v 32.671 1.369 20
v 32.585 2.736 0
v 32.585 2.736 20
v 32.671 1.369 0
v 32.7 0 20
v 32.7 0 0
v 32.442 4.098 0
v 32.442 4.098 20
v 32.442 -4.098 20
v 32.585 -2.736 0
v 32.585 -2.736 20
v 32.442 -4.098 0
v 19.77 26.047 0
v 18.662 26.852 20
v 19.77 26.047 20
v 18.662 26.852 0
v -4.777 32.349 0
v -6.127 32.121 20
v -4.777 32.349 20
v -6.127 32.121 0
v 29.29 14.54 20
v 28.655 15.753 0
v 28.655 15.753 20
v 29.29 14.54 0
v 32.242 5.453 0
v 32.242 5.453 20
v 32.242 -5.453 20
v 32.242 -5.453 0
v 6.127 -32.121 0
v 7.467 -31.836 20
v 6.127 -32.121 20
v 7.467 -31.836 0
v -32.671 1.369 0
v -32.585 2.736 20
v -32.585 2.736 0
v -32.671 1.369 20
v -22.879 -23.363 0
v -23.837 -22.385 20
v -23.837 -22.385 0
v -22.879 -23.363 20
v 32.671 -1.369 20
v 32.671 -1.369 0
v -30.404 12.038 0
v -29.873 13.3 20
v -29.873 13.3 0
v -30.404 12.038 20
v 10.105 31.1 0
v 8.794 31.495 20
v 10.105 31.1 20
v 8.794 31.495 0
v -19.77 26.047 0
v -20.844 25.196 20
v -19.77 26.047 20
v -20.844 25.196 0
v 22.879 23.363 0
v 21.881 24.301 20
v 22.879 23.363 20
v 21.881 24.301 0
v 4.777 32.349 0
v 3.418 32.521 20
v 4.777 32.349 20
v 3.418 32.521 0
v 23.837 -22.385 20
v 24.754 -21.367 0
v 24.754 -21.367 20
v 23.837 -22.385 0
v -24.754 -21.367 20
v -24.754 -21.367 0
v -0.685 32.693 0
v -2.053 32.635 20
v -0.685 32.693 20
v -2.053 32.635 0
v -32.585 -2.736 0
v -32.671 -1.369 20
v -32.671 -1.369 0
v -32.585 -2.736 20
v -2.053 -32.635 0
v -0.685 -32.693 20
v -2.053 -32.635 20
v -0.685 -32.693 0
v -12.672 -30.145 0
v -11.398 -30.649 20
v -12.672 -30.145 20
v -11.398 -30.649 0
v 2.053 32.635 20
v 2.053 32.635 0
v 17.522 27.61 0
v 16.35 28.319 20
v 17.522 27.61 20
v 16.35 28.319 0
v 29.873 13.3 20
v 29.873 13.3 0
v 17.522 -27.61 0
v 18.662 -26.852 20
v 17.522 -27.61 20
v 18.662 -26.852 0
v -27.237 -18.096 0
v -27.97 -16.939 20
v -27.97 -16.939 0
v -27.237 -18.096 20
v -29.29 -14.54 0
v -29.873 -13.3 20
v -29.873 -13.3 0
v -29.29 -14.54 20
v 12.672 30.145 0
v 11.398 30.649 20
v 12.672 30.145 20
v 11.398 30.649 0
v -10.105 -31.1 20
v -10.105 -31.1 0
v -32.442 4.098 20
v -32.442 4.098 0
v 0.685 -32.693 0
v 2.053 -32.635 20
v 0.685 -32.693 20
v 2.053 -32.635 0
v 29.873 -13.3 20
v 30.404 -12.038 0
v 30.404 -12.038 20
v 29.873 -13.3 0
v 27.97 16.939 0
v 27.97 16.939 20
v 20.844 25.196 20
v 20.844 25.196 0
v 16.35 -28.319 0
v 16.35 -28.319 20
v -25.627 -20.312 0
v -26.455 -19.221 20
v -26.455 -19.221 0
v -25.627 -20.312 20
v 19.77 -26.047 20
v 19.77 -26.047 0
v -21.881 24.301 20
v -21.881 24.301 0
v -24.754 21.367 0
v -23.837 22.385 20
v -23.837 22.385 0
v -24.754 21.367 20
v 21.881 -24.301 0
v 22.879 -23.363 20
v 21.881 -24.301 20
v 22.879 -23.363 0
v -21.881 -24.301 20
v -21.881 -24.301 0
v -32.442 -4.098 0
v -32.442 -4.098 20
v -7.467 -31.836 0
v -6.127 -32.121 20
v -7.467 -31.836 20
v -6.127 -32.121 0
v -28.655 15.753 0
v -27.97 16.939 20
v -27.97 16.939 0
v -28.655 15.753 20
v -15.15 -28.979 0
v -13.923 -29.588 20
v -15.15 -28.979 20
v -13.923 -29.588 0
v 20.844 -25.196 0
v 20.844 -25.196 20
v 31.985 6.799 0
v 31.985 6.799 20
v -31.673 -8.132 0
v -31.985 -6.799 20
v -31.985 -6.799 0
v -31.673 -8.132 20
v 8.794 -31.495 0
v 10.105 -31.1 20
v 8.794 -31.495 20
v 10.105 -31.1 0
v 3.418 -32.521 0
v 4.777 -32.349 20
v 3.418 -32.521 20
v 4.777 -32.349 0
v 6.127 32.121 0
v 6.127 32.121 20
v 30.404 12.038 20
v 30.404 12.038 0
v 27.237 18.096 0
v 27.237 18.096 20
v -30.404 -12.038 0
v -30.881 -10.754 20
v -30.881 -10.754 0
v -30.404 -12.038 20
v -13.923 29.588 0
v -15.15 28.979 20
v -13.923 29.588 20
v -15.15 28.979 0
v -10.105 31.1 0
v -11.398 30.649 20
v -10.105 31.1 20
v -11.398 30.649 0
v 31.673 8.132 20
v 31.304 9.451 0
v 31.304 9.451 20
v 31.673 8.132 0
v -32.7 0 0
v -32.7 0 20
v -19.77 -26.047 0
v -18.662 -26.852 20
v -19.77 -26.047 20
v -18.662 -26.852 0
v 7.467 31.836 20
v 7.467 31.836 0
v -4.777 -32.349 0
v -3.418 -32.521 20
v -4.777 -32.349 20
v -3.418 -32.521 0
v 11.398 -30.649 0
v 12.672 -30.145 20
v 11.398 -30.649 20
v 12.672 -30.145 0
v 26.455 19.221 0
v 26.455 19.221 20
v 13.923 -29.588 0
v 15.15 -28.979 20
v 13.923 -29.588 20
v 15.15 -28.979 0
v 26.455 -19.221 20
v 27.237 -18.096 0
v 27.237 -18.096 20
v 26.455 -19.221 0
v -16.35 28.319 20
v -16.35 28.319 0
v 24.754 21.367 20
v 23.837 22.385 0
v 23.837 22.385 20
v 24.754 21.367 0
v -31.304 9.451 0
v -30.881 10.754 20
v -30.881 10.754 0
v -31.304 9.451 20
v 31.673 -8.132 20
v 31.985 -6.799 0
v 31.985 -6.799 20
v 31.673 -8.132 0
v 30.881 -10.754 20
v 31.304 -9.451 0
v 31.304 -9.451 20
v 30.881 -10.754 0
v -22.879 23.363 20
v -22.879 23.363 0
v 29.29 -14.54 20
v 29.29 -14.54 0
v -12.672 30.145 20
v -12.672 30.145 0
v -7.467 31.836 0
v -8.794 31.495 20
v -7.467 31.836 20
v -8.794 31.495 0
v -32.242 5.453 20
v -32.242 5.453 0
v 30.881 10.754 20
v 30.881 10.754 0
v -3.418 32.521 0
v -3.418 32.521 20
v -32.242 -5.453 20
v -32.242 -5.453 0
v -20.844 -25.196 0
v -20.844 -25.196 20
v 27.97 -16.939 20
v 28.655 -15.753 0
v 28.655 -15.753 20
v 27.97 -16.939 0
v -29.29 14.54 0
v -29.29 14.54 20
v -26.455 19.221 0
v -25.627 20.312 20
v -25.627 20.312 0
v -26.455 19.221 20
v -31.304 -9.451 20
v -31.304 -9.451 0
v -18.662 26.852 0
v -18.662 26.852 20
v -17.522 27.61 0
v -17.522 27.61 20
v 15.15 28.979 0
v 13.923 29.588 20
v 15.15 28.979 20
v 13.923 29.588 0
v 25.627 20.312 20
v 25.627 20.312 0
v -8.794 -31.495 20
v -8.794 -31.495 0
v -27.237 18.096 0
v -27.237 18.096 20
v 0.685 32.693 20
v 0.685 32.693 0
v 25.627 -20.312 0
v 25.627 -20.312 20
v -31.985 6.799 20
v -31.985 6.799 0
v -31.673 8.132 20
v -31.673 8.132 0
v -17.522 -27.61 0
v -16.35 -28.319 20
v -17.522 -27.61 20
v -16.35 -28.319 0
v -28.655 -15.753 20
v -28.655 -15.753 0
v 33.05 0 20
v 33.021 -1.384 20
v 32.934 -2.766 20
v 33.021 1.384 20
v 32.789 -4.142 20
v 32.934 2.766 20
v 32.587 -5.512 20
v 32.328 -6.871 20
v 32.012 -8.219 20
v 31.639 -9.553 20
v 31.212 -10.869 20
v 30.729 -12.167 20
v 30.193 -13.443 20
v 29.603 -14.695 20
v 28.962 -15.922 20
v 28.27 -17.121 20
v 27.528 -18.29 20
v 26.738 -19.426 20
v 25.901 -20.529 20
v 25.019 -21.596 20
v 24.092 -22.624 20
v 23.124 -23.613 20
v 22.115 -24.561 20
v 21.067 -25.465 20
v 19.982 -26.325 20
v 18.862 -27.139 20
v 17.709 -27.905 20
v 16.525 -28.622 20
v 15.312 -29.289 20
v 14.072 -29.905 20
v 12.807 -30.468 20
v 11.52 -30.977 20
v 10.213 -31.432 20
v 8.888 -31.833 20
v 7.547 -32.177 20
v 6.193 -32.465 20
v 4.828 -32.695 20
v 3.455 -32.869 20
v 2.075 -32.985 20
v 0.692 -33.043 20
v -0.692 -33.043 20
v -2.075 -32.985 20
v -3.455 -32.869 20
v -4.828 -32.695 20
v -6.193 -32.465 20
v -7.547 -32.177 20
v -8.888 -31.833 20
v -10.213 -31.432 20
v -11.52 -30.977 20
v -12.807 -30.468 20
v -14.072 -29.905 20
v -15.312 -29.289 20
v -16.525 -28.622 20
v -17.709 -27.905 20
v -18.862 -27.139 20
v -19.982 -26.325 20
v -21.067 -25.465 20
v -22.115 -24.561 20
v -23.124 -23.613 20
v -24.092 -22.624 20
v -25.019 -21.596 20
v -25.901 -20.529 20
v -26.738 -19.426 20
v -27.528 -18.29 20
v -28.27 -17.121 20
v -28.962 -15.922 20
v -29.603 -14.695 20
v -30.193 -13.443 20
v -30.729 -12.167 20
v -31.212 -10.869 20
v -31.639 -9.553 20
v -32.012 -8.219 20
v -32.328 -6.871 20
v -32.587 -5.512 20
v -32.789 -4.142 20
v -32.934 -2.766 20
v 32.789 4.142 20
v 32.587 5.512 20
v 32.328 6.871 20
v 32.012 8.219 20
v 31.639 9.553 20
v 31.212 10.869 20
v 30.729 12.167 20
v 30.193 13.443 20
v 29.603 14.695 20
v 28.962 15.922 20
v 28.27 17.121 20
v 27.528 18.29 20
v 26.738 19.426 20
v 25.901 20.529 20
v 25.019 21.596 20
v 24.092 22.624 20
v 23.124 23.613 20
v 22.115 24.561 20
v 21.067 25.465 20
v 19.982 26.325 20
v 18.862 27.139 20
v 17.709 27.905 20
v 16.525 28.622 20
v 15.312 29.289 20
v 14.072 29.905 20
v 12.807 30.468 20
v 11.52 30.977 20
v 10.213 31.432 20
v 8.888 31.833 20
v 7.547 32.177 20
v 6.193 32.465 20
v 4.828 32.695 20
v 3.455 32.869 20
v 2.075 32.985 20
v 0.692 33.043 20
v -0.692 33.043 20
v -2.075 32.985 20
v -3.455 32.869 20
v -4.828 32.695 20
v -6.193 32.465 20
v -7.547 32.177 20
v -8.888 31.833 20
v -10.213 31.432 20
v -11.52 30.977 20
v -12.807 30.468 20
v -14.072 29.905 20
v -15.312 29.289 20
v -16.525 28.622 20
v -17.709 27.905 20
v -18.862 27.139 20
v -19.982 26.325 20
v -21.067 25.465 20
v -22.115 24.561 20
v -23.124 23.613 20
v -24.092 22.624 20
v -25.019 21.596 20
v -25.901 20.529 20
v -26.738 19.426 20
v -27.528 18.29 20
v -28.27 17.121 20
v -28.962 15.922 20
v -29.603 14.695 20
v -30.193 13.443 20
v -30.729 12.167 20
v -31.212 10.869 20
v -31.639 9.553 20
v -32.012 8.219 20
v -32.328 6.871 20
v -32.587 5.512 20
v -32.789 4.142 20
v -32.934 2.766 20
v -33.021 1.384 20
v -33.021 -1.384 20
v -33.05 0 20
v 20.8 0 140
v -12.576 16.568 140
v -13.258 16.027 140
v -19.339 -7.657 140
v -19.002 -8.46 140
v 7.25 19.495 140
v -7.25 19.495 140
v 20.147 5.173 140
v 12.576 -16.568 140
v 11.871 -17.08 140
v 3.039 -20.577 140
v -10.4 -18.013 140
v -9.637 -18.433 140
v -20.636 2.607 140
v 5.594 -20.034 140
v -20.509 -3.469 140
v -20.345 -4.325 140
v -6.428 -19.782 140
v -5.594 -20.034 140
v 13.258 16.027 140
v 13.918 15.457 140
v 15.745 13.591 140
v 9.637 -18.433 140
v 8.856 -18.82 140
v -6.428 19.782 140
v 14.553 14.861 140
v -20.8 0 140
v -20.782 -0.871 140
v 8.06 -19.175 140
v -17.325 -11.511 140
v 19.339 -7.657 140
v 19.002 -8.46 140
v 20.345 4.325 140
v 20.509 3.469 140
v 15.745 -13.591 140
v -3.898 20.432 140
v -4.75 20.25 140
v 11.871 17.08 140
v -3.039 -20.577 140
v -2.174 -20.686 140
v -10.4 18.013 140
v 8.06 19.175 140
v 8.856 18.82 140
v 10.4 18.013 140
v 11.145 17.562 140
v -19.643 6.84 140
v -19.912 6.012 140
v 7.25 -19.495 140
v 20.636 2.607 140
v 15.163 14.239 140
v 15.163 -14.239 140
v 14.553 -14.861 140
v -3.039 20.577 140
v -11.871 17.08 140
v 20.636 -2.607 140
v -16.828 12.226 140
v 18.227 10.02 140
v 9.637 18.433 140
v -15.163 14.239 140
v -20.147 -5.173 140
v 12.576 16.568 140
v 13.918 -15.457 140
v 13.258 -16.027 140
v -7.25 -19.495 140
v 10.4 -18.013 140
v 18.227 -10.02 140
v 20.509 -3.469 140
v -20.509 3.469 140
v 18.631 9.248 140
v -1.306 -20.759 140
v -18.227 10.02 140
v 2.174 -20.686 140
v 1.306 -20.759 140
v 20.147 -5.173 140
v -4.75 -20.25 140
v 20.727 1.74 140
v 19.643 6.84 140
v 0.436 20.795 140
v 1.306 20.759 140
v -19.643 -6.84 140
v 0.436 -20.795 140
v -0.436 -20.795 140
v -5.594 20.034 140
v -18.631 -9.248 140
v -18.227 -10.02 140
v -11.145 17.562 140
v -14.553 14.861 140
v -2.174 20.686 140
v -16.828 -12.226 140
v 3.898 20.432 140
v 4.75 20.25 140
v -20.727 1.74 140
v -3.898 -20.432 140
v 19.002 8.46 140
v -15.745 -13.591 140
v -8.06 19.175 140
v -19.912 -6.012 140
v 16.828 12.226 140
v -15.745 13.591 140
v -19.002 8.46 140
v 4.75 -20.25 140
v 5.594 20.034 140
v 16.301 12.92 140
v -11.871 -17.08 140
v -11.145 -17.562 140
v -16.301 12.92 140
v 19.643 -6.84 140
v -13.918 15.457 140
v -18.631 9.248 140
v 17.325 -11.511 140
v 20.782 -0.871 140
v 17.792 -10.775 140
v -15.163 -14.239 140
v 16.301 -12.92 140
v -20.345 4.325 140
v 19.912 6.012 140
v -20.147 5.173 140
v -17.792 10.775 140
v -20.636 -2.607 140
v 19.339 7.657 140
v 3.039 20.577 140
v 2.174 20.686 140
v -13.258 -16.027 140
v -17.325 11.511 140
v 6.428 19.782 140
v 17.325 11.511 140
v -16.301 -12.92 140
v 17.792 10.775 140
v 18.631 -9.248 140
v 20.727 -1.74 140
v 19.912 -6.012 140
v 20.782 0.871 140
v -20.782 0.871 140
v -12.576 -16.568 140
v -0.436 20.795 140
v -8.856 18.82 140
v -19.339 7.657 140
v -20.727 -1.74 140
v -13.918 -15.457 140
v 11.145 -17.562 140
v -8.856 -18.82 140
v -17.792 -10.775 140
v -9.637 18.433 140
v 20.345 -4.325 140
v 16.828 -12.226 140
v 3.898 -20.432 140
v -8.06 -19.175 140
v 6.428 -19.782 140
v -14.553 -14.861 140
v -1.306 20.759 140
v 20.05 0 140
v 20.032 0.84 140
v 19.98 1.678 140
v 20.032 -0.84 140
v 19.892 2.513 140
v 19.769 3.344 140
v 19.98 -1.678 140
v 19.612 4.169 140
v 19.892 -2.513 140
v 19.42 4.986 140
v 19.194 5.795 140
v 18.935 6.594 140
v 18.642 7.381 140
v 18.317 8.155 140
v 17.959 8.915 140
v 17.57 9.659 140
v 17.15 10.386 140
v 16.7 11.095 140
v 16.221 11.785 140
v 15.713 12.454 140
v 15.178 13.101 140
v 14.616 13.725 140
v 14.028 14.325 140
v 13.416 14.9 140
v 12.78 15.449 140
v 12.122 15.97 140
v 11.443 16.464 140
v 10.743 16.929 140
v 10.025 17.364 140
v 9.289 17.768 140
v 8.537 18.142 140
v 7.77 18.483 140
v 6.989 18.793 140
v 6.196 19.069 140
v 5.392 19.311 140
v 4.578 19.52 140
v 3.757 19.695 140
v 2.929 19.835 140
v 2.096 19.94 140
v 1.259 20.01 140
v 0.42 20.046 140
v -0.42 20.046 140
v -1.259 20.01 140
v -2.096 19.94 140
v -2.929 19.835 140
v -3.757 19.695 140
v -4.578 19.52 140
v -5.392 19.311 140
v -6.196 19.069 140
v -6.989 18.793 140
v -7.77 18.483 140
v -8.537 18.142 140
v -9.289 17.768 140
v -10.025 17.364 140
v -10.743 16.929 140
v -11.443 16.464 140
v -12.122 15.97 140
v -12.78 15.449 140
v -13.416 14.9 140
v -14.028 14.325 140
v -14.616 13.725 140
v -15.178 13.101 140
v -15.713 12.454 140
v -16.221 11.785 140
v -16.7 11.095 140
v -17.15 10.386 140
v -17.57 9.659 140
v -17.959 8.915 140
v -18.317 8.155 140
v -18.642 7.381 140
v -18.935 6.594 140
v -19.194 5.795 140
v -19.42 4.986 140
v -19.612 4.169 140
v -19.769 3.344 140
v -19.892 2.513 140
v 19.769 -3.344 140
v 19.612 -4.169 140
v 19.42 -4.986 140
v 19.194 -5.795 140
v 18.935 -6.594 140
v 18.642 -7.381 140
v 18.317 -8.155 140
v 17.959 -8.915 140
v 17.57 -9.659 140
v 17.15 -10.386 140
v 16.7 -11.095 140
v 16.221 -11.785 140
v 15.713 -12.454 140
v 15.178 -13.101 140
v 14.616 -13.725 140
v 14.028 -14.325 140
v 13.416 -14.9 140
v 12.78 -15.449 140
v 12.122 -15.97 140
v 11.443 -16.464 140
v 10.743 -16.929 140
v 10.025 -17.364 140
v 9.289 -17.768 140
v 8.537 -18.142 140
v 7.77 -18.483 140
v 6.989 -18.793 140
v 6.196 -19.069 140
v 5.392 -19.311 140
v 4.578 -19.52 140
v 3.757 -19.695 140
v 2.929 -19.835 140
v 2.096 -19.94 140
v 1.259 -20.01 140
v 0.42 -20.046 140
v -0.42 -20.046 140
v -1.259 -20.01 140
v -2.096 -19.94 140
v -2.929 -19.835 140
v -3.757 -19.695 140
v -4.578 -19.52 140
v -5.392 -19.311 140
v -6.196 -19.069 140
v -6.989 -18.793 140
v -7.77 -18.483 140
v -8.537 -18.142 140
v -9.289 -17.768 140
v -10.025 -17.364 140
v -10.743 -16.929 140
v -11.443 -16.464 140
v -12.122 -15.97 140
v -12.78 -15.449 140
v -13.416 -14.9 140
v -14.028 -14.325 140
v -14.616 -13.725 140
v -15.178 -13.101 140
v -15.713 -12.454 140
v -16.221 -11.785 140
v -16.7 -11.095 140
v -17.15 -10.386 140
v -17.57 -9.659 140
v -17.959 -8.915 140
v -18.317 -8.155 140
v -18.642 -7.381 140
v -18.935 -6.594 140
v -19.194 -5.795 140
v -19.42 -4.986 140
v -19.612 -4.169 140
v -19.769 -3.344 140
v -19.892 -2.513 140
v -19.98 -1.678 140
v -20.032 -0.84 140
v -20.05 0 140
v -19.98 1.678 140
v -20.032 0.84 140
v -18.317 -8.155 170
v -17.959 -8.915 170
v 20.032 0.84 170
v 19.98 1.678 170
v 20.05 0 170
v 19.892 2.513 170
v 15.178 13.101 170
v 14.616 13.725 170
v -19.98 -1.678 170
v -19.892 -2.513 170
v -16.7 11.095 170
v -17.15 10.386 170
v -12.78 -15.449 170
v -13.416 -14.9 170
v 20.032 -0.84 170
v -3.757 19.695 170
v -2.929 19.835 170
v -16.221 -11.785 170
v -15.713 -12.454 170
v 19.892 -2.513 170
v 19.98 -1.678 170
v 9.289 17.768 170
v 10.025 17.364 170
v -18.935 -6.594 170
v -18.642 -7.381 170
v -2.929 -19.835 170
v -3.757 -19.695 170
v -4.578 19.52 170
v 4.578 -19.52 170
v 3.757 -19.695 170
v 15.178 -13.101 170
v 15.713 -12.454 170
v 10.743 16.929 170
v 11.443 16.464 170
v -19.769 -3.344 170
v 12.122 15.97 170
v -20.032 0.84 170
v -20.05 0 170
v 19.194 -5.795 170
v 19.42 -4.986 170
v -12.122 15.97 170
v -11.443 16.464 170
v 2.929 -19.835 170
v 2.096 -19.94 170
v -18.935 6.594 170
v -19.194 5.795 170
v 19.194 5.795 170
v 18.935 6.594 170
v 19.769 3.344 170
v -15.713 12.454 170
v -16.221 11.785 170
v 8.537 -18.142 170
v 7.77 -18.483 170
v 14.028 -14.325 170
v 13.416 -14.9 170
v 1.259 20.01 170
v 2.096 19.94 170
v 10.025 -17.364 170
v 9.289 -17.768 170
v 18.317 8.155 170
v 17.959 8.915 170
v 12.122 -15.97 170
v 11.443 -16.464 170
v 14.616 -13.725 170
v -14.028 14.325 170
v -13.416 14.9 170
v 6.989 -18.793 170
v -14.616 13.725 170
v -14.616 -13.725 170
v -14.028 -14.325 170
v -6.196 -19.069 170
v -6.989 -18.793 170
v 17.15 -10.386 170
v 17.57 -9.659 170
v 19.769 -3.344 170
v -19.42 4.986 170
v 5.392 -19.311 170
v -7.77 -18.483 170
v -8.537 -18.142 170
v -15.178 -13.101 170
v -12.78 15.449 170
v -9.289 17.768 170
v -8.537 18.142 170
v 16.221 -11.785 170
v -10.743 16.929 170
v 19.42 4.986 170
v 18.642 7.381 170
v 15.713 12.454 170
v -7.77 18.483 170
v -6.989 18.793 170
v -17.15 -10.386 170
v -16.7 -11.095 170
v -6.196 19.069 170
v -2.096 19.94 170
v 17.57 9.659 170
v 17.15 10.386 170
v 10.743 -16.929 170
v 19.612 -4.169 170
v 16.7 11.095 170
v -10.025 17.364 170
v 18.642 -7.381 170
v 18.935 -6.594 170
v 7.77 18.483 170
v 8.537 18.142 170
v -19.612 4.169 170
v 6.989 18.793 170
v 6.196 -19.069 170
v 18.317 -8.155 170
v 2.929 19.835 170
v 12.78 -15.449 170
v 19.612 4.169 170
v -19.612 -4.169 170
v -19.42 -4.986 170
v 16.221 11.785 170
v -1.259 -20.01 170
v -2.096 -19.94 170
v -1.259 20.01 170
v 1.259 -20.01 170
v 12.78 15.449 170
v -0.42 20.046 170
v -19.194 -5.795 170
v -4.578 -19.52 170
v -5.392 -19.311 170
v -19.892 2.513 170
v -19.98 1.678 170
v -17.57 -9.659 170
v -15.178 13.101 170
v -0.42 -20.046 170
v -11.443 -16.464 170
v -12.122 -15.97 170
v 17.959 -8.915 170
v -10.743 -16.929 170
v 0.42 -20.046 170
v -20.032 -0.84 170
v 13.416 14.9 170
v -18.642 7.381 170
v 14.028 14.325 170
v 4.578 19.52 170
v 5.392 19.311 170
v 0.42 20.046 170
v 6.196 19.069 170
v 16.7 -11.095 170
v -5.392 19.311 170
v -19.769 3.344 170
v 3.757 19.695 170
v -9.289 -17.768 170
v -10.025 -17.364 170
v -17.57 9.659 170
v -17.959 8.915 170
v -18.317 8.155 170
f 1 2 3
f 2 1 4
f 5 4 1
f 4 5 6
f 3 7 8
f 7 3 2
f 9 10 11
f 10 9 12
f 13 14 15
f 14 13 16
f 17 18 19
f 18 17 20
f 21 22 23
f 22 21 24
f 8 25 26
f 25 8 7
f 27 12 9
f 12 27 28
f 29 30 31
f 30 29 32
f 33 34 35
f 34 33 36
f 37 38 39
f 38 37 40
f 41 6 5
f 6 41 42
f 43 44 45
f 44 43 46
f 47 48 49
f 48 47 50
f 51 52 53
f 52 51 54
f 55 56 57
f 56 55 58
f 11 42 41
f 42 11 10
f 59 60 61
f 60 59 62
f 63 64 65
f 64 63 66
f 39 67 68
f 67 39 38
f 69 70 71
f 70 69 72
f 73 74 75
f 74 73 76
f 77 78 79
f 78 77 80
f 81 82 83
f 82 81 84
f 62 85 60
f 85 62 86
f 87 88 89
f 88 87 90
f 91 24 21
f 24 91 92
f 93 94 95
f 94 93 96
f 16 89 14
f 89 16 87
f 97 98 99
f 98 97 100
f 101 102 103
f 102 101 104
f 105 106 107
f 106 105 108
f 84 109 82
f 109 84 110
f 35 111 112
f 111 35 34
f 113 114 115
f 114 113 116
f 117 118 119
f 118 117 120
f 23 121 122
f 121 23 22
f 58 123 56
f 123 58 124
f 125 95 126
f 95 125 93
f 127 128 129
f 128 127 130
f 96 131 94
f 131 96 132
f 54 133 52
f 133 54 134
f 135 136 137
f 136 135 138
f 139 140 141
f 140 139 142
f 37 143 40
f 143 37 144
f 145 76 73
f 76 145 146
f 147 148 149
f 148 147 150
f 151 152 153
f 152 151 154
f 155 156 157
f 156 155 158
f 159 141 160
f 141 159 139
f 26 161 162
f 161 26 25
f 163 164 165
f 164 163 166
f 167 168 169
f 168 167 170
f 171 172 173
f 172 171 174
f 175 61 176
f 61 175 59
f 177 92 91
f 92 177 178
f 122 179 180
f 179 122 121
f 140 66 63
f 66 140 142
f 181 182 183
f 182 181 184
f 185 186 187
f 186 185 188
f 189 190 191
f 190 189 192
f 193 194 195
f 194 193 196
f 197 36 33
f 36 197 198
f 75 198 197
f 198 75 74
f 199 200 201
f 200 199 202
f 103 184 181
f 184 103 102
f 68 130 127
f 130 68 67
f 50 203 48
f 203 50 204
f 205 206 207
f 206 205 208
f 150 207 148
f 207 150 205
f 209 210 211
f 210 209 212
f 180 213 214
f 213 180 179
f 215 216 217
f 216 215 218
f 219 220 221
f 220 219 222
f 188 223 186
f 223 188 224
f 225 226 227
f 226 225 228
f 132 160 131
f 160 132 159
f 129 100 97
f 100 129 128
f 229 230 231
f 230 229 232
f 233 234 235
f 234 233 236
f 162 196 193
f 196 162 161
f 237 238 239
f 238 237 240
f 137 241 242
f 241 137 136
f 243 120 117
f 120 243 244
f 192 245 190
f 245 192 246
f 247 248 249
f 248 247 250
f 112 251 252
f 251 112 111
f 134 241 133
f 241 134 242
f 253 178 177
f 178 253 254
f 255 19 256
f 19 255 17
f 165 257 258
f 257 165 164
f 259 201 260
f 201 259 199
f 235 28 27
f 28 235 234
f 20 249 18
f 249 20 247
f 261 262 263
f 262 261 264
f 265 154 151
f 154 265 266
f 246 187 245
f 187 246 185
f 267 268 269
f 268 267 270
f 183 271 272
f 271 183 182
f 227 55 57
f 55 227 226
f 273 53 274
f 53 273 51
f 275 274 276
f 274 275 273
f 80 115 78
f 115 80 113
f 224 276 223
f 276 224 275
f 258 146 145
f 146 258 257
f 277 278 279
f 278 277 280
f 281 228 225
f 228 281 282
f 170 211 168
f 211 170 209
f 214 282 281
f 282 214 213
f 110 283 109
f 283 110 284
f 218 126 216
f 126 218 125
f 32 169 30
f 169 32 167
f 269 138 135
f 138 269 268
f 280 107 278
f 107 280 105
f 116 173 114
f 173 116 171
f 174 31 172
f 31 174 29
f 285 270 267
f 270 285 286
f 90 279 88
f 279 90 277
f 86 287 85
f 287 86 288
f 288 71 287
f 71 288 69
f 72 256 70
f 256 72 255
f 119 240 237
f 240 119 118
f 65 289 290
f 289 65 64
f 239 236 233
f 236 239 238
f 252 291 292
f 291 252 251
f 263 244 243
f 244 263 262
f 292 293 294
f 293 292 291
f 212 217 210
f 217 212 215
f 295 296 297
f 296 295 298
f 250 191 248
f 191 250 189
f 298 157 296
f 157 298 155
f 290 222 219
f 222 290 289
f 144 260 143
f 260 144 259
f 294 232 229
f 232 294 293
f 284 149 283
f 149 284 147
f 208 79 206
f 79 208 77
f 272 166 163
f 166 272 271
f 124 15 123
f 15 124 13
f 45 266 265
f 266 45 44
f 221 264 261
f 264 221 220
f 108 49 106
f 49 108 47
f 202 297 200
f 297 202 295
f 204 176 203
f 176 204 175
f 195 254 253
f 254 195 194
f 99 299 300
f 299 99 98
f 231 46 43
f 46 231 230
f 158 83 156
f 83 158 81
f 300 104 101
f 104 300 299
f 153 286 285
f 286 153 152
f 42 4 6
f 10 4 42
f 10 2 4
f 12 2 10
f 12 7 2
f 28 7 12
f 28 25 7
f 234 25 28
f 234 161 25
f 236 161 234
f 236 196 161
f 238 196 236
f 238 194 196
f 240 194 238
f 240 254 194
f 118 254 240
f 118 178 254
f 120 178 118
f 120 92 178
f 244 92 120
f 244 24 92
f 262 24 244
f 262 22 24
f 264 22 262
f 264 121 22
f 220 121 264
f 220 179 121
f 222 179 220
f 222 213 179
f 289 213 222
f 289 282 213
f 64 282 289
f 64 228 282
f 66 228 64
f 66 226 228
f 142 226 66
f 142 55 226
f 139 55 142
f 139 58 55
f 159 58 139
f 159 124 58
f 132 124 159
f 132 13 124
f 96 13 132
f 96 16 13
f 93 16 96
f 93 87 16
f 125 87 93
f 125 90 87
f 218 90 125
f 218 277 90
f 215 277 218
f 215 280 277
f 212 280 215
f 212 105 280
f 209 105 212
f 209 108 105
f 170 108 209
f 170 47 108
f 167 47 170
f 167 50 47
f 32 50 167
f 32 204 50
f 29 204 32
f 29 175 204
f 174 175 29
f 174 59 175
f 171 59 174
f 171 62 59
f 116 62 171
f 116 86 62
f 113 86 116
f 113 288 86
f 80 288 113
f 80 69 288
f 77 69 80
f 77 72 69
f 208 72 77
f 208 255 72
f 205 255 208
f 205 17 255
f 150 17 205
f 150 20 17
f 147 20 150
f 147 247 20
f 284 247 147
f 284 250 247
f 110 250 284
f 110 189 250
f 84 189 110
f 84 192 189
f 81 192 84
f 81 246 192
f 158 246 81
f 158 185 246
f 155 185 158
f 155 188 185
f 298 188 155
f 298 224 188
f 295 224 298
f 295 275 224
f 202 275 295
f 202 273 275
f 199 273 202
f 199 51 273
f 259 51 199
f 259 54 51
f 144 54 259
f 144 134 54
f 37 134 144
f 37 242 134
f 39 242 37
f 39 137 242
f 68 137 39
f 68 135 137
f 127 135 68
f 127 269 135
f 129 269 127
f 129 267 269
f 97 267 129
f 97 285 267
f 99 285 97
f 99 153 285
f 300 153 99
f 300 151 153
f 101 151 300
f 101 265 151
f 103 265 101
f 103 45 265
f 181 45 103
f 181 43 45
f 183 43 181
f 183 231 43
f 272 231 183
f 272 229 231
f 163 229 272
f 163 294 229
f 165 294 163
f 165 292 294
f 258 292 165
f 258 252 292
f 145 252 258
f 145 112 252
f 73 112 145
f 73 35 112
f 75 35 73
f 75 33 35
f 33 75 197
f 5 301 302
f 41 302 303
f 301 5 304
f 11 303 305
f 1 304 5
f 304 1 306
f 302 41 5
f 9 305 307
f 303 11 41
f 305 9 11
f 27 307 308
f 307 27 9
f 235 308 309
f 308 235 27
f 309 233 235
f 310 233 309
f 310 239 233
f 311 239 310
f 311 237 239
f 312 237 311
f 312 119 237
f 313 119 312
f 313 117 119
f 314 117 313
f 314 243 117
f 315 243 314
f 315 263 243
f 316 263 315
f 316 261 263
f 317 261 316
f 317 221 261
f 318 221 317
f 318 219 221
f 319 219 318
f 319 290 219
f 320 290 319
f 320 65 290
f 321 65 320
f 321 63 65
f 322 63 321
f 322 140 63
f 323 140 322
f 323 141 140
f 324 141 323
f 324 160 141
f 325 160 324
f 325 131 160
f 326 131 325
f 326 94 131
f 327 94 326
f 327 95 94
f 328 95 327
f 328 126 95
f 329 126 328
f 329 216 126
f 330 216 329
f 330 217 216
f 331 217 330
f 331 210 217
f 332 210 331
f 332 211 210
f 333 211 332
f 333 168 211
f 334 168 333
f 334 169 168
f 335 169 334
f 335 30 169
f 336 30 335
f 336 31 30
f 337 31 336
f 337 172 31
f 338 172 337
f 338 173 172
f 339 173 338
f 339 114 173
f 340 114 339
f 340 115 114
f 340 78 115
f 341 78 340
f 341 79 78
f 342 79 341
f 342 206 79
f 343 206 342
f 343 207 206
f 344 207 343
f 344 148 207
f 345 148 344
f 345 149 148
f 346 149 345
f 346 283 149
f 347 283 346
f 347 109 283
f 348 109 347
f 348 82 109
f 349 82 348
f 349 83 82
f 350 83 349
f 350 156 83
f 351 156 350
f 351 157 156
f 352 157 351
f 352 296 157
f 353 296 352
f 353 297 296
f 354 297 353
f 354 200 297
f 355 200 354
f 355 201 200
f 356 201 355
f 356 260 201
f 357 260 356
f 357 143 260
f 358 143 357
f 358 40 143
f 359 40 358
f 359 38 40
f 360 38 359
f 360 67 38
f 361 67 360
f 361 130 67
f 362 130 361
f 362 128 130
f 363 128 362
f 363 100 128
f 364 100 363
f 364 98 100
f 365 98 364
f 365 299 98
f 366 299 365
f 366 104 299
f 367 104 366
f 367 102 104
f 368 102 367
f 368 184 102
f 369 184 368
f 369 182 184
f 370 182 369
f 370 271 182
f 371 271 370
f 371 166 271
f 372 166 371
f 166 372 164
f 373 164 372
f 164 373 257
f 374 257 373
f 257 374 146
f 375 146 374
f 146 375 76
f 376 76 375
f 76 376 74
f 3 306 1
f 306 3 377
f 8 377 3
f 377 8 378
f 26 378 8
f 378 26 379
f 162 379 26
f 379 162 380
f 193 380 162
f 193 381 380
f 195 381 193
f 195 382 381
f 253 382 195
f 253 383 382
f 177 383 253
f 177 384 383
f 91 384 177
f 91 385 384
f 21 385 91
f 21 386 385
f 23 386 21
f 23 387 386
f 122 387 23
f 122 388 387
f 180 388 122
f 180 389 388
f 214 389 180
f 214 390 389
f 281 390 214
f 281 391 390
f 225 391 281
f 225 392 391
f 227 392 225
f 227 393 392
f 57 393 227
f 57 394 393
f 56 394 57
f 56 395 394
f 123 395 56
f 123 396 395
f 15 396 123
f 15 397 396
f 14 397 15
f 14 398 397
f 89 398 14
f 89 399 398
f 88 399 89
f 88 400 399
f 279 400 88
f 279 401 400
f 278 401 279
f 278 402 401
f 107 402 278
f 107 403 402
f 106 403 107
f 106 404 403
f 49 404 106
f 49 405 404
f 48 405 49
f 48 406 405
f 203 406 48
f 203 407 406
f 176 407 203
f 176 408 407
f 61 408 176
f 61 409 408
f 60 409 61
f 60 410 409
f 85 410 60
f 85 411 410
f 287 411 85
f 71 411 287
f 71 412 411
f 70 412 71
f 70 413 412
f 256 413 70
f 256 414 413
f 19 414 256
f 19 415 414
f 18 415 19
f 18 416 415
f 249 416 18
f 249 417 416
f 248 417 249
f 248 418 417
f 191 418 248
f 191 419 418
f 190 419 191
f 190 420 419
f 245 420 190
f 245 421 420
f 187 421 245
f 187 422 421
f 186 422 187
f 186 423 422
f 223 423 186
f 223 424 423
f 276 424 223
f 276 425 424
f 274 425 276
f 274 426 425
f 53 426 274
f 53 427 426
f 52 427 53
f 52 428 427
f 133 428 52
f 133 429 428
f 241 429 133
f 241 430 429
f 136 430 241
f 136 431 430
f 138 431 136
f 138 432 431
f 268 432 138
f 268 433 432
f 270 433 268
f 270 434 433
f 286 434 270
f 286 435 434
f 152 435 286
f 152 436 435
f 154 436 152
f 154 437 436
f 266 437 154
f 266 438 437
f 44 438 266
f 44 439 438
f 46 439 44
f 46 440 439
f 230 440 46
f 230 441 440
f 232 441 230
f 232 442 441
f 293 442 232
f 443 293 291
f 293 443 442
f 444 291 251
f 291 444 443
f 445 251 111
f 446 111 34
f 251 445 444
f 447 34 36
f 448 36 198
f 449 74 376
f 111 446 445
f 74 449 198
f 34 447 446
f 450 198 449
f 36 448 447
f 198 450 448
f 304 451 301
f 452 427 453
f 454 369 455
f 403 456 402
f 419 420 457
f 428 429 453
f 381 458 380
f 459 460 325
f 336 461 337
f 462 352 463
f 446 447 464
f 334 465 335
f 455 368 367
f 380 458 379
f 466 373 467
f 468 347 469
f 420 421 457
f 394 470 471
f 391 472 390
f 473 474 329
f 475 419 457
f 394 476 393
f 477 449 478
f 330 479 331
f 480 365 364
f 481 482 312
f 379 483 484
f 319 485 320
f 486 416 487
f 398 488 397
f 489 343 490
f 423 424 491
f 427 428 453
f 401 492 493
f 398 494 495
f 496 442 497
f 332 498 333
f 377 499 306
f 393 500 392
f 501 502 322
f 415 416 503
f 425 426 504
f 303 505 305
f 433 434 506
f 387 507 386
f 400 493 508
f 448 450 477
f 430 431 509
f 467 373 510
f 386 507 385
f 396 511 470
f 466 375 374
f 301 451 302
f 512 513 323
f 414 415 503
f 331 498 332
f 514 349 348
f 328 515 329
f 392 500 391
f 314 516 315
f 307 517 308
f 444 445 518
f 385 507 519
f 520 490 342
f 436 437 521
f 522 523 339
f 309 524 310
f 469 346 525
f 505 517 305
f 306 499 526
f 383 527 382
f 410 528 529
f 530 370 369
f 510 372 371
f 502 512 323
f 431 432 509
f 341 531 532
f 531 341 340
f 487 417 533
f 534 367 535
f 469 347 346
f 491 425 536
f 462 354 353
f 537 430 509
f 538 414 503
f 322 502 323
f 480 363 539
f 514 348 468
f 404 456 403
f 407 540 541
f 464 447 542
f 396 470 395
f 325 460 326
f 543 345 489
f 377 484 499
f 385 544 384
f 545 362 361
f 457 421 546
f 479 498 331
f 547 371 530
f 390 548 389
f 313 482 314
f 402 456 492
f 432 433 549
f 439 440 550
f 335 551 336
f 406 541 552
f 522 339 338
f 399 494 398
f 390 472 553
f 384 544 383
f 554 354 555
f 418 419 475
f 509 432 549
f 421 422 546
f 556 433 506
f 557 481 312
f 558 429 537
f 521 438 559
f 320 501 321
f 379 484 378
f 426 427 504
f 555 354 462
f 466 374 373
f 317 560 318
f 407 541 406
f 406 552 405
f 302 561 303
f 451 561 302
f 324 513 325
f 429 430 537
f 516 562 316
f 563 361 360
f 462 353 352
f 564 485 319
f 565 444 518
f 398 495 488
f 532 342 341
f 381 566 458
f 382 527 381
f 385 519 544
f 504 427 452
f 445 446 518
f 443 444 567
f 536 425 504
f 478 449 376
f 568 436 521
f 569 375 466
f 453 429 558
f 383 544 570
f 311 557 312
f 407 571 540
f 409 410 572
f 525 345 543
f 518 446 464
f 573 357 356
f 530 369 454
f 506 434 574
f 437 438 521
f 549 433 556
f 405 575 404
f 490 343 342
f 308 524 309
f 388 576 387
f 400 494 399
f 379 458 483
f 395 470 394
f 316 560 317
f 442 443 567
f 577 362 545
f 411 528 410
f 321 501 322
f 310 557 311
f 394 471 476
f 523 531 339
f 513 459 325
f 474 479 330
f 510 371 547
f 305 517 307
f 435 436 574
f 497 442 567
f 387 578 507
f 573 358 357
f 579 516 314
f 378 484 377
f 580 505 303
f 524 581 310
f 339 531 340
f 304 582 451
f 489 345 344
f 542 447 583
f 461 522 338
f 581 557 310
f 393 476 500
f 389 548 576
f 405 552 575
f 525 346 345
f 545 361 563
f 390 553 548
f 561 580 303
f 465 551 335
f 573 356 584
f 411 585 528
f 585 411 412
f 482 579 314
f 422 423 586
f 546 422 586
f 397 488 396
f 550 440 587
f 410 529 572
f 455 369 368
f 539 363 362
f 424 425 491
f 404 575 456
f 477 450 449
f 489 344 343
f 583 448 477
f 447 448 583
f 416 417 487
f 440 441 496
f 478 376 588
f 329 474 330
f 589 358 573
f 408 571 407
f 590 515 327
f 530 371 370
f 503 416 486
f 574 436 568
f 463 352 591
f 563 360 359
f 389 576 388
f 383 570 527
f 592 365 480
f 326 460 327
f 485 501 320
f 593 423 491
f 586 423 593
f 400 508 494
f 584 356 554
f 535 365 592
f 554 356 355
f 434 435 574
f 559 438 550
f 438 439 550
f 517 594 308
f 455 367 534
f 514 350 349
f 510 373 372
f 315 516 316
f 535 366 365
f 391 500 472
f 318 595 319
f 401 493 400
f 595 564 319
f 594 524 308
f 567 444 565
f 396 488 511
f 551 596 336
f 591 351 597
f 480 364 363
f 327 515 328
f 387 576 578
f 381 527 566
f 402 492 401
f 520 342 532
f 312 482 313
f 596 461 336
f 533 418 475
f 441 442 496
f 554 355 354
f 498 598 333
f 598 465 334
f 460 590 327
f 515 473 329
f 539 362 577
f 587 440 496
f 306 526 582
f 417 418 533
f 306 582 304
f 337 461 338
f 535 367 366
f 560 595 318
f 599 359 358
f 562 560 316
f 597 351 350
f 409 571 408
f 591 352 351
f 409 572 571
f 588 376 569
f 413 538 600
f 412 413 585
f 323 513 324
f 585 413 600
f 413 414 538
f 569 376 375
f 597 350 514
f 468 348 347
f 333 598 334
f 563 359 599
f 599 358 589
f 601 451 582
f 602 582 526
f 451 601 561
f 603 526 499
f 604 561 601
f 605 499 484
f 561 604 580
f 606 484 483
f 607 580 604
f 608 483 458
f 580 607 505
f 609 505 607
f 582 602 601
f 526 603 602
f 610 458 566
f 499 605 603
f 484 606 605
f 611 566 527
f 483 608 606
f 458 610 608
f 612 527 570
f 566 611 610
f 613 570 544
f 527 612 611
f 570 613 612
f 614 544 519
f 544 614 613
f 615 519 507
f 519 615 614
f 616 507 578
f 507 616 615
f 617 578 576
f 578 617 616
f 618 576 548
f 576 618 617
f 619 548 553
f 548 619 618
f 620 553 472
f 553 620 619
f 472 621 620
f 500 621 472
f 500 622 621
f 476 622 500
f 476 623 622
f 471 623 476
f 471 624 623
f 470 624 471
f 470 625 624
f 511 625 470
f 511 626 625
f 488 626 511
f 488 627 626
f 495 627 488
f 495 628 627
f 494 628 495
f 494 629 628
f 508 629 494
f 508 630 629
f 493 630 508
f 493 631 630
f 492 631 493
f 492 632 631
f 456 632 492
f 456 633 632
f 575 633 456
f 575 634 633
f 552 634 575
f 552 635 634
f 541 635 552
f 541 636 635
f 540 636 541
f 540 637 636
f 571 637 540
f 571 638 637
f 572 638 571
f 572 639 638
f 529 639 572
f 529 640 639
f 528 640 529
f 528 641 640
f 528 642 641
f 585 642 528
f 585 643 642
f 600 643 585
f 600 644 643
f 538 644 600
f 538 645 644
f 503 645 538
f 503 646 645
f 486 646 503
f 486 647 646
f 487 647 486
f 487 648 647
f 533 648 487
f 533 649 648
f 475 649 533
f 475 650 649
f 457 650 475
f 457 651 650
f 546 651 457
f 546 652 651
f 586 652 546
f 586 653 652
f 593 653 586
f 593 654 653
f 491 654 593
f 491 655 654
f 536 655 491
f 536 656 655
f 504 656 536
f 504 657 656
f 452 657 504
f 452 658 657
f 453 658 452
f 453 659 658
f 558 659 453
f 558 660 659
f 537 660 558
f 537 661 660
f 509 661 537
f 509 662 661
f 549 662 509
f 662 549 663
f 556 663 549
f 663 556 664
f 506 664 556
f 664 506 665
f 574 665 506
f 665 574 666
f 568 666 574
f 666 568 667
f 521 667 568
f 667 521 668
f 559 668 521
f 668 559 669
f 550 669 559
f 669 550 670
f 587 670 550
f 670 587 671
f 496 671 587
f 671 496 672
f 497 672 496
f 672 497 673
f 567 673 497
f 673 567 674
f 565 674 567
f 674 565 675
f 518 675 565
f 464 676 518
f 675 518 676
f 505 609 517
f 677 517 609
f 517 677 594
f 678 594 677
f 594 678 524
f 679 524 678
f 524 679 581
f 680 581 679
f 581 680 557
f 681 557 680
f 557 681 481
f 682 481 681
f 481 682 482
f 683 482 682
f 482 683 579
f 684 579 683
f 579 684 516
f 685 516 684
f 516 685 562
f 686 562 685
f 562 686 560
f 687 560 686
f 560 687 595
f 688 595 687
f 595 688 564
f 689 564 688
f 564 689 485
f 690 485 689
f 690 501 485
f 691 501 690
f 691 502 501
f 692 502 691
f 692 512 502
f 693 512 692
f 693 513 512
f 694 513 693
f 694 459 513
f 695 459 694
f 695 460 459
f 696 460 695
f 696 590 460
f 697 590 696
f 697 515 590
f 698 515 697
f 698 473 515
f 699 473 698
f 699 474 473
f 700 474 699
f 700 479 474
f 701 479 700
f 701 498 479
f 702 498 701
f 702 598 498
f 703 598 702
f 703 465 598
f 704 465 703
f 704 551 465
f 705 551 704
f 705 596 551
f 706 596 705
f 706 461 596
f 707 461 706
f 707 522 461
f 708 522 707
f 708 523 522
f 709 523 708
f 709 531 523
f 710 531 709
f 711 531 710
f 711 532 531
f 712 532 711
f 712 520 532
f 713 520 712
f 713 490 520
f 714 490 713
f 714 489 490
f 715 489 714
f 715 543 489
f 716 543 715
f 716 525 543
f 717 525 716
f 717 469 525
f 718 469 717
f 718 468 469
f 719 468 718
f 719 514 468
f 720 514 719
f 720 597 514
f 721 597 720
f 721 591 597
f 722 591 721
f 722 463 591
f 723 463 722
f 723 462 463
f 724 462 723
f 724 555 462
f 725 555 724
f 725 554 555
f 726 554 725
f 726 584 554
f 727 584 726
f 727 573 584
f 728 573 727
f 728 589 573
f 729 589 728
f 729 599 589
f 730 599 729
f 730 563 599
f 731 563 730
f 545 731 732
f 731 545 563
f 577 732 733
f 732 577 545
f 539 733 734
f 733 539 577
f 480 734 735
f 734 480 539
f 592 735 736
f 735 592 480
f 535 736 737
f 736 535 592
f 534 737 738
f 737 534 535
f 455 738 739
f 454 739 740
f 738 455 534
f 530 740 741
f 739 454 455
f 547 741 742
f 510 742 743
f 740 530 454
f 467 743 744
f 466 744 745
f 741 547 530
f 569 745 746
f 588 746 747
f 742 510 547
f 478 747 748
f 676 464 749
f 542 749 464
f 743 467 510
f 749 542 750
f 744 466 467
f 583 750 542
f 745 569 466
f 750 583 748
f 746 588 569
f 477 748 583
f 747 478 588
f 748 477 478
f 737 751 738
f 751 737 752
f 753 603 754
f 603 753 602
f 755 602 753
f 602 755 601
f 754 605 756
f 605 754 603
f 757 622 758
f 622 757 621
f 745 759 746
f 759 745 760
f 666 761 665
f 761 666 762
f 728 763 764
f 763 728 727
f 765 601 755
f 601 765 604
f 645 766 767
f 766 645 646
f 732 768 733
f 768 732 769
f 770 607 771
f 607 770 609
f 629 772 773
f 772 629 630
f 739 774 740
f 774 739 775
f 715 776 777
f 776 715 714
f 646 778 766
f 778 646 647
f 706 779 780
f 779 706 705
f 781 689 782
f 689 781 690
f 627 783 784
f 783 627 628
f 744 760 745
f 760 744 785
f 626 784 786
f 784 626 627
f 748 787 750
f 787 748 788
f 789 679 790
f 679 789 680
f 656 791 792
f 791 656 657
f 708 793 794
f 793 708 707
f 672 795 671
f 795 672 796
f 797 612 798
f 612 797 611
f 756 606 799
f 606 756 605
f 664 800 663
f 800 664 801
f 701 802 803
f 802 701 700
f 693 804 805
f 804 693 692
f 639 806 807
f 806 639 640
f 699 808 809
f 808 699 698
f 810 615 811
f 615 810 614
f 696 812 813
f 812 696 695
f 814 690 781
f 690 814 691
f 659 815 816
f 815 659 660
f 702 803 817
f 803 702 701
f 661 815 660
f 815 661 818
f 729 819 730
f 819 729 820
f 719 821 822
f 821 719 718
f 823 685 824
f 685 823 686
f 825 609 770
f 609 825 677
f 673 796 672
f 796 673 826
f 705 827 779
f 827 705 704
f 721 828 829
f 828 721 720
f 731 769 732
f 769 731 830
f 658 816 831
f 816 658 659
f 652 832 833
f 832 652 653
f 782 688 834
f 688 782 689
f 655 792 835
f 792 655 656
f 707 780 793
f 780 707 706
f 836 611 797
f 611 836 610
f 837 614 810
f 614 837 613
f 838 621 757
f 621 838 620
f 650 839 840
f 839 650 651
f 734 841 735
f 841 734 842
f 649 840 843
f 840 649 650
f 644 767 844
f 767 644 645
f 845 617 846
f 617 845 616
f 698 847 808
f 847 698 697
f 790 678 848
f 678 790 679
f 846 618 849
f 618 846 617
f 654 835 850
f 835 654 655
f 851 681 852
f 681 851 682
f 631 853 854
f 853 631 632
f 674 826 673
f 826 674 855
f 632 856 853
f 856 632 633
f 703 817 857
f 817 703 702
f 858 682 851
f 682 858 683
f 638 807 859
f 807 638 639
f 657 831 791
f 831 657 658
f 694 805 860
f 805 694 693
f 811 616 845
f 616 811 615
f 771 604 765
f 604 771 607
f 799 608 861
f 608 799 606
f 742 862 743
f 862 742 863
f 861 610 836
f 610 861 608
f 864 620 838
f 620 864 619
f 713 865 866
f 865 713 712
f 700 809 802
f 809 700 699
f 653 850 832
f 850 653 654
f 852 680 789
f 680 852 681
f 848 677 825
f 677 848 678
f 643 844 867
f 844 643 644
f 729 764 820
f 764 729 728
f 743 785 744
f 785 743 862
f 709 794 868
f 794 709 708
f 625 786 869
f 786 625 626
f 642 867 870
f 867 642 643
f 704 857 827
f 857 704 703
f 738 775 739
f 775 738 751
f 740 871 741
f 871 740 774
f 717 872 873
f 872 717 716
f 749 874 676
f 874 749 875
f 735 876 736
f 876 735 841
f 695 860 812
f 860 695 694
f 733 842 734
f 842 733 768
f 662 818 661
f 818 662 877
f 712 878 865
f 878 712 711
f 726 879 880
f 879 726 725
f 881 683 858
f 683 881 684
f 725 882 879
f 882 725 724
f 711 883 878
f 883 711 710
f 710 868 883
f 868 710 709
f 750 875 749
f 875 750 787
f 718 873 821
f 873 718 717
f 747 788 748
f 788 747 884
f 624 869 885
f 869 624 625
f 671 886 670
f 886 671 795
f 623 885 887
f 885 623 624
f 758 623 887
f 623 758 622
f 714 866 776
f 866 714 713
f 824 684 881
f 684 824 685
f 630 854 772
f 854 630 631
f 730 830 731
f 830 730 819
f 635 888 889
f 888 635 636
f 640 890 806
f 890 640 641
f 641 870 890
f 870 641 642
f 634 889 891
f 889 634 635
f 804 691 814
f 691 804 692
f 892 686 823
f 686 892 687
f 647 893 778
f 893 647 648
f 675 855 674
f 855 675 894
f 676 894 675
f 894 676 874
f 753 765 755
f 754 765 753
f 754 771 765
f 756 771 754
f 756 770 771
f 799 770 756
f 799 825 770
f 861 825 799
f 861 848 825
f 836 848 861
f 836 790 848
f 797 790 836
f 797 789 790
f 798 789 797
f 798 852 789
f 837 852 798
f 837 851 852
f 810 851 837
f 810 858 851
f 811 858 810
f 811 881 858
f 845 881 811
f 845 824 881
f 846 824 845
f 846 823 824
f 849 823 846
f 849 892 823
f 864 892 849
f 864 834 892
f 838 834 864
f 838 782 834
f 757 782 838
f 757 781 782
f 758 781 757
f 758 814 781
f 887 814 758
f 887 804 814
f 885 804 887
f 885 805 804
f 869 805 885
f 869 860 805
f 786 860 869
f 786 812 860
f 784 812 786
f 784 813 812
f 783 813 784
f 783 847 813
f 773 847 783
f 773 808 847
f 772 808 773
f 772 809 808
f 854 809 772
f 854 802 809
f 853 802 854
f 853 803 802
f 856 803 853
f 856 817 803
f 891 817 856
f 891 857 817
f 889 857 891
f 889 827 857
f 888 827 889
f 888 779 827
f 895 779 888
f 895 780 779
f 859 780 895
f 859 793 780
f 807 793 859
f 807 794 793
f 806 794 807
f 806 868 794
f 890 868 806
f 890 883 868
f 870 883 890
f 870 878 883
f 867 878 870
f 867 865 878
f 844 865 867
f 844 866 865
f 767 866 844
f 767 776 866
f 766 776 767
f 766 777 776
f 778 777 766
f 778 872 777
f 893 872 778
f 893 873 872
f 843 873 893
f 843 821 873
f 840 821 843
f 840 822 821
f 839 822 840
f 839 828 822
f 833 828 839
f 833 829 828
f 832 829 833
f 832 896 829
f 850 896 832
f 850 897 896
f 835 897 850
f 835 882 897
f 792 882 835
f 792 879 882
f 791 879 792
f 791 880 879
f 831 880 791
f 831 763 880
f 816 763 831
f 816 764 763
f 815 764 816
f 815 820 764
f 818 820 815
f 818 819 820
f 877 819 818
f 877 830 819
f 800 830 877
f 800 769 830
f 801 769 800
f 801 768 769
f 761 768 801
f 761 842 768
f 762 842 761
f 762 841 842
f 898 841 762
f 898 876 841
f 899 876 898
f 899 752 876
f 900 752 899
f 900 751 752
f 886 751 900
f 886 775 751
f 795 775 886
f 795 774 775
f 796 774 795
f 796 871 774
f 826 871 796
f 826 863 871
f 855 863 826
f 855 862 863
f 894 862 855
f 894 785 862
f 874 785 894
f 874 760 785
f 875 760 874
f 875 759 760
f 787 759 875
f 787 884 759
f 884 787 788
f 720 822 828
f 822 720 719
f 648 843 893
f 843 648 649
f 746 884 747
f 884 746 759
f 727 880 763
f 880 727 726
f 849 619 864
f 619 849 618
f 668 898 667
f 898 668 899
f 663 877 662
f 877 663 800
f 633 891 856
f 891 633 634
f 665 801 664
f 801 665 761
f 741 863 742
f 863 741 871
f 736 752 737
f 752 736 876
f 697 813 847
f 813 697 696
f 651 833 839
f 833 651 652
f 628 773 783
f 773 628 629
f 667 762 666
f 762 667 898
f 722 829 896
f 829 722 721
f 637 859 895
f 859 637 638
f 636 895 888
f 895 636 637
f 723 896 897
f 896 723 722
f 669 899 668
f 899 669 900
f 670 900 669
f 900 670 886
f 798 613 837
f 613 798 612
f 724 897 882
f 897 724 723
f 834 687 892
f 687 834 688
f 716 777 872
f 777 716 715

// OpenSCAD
// variable description
shoulder1_diameter = 65.4;
shoulder1_length = 20;
transition_diameter_1 = 66.1;
transition_length = 120;
transition_diameter_2 = 41.6;
shoulder2_diameter = 40.1;
shoulder2_length = 30;
// 

$fn=150;
union(){
translate([0,0,shoulder1_length/2])cylinder(shoulder1_length,shoulder1_diameter/2,shoulder1_diameter/2,center=true);
translate([0,0,(transition_length/2 +shoulder1_length )])cylinder(transition_length,transition_diameter_1/2,transition_diameter_2/2,center=true);
translate([0,0,(shoulder1_length + transition_length + shoulder2_length/2)])cylinder(shoulder2_length,shoulder2_diameter/2,shoulder2_diameter/2,center=true);
}
